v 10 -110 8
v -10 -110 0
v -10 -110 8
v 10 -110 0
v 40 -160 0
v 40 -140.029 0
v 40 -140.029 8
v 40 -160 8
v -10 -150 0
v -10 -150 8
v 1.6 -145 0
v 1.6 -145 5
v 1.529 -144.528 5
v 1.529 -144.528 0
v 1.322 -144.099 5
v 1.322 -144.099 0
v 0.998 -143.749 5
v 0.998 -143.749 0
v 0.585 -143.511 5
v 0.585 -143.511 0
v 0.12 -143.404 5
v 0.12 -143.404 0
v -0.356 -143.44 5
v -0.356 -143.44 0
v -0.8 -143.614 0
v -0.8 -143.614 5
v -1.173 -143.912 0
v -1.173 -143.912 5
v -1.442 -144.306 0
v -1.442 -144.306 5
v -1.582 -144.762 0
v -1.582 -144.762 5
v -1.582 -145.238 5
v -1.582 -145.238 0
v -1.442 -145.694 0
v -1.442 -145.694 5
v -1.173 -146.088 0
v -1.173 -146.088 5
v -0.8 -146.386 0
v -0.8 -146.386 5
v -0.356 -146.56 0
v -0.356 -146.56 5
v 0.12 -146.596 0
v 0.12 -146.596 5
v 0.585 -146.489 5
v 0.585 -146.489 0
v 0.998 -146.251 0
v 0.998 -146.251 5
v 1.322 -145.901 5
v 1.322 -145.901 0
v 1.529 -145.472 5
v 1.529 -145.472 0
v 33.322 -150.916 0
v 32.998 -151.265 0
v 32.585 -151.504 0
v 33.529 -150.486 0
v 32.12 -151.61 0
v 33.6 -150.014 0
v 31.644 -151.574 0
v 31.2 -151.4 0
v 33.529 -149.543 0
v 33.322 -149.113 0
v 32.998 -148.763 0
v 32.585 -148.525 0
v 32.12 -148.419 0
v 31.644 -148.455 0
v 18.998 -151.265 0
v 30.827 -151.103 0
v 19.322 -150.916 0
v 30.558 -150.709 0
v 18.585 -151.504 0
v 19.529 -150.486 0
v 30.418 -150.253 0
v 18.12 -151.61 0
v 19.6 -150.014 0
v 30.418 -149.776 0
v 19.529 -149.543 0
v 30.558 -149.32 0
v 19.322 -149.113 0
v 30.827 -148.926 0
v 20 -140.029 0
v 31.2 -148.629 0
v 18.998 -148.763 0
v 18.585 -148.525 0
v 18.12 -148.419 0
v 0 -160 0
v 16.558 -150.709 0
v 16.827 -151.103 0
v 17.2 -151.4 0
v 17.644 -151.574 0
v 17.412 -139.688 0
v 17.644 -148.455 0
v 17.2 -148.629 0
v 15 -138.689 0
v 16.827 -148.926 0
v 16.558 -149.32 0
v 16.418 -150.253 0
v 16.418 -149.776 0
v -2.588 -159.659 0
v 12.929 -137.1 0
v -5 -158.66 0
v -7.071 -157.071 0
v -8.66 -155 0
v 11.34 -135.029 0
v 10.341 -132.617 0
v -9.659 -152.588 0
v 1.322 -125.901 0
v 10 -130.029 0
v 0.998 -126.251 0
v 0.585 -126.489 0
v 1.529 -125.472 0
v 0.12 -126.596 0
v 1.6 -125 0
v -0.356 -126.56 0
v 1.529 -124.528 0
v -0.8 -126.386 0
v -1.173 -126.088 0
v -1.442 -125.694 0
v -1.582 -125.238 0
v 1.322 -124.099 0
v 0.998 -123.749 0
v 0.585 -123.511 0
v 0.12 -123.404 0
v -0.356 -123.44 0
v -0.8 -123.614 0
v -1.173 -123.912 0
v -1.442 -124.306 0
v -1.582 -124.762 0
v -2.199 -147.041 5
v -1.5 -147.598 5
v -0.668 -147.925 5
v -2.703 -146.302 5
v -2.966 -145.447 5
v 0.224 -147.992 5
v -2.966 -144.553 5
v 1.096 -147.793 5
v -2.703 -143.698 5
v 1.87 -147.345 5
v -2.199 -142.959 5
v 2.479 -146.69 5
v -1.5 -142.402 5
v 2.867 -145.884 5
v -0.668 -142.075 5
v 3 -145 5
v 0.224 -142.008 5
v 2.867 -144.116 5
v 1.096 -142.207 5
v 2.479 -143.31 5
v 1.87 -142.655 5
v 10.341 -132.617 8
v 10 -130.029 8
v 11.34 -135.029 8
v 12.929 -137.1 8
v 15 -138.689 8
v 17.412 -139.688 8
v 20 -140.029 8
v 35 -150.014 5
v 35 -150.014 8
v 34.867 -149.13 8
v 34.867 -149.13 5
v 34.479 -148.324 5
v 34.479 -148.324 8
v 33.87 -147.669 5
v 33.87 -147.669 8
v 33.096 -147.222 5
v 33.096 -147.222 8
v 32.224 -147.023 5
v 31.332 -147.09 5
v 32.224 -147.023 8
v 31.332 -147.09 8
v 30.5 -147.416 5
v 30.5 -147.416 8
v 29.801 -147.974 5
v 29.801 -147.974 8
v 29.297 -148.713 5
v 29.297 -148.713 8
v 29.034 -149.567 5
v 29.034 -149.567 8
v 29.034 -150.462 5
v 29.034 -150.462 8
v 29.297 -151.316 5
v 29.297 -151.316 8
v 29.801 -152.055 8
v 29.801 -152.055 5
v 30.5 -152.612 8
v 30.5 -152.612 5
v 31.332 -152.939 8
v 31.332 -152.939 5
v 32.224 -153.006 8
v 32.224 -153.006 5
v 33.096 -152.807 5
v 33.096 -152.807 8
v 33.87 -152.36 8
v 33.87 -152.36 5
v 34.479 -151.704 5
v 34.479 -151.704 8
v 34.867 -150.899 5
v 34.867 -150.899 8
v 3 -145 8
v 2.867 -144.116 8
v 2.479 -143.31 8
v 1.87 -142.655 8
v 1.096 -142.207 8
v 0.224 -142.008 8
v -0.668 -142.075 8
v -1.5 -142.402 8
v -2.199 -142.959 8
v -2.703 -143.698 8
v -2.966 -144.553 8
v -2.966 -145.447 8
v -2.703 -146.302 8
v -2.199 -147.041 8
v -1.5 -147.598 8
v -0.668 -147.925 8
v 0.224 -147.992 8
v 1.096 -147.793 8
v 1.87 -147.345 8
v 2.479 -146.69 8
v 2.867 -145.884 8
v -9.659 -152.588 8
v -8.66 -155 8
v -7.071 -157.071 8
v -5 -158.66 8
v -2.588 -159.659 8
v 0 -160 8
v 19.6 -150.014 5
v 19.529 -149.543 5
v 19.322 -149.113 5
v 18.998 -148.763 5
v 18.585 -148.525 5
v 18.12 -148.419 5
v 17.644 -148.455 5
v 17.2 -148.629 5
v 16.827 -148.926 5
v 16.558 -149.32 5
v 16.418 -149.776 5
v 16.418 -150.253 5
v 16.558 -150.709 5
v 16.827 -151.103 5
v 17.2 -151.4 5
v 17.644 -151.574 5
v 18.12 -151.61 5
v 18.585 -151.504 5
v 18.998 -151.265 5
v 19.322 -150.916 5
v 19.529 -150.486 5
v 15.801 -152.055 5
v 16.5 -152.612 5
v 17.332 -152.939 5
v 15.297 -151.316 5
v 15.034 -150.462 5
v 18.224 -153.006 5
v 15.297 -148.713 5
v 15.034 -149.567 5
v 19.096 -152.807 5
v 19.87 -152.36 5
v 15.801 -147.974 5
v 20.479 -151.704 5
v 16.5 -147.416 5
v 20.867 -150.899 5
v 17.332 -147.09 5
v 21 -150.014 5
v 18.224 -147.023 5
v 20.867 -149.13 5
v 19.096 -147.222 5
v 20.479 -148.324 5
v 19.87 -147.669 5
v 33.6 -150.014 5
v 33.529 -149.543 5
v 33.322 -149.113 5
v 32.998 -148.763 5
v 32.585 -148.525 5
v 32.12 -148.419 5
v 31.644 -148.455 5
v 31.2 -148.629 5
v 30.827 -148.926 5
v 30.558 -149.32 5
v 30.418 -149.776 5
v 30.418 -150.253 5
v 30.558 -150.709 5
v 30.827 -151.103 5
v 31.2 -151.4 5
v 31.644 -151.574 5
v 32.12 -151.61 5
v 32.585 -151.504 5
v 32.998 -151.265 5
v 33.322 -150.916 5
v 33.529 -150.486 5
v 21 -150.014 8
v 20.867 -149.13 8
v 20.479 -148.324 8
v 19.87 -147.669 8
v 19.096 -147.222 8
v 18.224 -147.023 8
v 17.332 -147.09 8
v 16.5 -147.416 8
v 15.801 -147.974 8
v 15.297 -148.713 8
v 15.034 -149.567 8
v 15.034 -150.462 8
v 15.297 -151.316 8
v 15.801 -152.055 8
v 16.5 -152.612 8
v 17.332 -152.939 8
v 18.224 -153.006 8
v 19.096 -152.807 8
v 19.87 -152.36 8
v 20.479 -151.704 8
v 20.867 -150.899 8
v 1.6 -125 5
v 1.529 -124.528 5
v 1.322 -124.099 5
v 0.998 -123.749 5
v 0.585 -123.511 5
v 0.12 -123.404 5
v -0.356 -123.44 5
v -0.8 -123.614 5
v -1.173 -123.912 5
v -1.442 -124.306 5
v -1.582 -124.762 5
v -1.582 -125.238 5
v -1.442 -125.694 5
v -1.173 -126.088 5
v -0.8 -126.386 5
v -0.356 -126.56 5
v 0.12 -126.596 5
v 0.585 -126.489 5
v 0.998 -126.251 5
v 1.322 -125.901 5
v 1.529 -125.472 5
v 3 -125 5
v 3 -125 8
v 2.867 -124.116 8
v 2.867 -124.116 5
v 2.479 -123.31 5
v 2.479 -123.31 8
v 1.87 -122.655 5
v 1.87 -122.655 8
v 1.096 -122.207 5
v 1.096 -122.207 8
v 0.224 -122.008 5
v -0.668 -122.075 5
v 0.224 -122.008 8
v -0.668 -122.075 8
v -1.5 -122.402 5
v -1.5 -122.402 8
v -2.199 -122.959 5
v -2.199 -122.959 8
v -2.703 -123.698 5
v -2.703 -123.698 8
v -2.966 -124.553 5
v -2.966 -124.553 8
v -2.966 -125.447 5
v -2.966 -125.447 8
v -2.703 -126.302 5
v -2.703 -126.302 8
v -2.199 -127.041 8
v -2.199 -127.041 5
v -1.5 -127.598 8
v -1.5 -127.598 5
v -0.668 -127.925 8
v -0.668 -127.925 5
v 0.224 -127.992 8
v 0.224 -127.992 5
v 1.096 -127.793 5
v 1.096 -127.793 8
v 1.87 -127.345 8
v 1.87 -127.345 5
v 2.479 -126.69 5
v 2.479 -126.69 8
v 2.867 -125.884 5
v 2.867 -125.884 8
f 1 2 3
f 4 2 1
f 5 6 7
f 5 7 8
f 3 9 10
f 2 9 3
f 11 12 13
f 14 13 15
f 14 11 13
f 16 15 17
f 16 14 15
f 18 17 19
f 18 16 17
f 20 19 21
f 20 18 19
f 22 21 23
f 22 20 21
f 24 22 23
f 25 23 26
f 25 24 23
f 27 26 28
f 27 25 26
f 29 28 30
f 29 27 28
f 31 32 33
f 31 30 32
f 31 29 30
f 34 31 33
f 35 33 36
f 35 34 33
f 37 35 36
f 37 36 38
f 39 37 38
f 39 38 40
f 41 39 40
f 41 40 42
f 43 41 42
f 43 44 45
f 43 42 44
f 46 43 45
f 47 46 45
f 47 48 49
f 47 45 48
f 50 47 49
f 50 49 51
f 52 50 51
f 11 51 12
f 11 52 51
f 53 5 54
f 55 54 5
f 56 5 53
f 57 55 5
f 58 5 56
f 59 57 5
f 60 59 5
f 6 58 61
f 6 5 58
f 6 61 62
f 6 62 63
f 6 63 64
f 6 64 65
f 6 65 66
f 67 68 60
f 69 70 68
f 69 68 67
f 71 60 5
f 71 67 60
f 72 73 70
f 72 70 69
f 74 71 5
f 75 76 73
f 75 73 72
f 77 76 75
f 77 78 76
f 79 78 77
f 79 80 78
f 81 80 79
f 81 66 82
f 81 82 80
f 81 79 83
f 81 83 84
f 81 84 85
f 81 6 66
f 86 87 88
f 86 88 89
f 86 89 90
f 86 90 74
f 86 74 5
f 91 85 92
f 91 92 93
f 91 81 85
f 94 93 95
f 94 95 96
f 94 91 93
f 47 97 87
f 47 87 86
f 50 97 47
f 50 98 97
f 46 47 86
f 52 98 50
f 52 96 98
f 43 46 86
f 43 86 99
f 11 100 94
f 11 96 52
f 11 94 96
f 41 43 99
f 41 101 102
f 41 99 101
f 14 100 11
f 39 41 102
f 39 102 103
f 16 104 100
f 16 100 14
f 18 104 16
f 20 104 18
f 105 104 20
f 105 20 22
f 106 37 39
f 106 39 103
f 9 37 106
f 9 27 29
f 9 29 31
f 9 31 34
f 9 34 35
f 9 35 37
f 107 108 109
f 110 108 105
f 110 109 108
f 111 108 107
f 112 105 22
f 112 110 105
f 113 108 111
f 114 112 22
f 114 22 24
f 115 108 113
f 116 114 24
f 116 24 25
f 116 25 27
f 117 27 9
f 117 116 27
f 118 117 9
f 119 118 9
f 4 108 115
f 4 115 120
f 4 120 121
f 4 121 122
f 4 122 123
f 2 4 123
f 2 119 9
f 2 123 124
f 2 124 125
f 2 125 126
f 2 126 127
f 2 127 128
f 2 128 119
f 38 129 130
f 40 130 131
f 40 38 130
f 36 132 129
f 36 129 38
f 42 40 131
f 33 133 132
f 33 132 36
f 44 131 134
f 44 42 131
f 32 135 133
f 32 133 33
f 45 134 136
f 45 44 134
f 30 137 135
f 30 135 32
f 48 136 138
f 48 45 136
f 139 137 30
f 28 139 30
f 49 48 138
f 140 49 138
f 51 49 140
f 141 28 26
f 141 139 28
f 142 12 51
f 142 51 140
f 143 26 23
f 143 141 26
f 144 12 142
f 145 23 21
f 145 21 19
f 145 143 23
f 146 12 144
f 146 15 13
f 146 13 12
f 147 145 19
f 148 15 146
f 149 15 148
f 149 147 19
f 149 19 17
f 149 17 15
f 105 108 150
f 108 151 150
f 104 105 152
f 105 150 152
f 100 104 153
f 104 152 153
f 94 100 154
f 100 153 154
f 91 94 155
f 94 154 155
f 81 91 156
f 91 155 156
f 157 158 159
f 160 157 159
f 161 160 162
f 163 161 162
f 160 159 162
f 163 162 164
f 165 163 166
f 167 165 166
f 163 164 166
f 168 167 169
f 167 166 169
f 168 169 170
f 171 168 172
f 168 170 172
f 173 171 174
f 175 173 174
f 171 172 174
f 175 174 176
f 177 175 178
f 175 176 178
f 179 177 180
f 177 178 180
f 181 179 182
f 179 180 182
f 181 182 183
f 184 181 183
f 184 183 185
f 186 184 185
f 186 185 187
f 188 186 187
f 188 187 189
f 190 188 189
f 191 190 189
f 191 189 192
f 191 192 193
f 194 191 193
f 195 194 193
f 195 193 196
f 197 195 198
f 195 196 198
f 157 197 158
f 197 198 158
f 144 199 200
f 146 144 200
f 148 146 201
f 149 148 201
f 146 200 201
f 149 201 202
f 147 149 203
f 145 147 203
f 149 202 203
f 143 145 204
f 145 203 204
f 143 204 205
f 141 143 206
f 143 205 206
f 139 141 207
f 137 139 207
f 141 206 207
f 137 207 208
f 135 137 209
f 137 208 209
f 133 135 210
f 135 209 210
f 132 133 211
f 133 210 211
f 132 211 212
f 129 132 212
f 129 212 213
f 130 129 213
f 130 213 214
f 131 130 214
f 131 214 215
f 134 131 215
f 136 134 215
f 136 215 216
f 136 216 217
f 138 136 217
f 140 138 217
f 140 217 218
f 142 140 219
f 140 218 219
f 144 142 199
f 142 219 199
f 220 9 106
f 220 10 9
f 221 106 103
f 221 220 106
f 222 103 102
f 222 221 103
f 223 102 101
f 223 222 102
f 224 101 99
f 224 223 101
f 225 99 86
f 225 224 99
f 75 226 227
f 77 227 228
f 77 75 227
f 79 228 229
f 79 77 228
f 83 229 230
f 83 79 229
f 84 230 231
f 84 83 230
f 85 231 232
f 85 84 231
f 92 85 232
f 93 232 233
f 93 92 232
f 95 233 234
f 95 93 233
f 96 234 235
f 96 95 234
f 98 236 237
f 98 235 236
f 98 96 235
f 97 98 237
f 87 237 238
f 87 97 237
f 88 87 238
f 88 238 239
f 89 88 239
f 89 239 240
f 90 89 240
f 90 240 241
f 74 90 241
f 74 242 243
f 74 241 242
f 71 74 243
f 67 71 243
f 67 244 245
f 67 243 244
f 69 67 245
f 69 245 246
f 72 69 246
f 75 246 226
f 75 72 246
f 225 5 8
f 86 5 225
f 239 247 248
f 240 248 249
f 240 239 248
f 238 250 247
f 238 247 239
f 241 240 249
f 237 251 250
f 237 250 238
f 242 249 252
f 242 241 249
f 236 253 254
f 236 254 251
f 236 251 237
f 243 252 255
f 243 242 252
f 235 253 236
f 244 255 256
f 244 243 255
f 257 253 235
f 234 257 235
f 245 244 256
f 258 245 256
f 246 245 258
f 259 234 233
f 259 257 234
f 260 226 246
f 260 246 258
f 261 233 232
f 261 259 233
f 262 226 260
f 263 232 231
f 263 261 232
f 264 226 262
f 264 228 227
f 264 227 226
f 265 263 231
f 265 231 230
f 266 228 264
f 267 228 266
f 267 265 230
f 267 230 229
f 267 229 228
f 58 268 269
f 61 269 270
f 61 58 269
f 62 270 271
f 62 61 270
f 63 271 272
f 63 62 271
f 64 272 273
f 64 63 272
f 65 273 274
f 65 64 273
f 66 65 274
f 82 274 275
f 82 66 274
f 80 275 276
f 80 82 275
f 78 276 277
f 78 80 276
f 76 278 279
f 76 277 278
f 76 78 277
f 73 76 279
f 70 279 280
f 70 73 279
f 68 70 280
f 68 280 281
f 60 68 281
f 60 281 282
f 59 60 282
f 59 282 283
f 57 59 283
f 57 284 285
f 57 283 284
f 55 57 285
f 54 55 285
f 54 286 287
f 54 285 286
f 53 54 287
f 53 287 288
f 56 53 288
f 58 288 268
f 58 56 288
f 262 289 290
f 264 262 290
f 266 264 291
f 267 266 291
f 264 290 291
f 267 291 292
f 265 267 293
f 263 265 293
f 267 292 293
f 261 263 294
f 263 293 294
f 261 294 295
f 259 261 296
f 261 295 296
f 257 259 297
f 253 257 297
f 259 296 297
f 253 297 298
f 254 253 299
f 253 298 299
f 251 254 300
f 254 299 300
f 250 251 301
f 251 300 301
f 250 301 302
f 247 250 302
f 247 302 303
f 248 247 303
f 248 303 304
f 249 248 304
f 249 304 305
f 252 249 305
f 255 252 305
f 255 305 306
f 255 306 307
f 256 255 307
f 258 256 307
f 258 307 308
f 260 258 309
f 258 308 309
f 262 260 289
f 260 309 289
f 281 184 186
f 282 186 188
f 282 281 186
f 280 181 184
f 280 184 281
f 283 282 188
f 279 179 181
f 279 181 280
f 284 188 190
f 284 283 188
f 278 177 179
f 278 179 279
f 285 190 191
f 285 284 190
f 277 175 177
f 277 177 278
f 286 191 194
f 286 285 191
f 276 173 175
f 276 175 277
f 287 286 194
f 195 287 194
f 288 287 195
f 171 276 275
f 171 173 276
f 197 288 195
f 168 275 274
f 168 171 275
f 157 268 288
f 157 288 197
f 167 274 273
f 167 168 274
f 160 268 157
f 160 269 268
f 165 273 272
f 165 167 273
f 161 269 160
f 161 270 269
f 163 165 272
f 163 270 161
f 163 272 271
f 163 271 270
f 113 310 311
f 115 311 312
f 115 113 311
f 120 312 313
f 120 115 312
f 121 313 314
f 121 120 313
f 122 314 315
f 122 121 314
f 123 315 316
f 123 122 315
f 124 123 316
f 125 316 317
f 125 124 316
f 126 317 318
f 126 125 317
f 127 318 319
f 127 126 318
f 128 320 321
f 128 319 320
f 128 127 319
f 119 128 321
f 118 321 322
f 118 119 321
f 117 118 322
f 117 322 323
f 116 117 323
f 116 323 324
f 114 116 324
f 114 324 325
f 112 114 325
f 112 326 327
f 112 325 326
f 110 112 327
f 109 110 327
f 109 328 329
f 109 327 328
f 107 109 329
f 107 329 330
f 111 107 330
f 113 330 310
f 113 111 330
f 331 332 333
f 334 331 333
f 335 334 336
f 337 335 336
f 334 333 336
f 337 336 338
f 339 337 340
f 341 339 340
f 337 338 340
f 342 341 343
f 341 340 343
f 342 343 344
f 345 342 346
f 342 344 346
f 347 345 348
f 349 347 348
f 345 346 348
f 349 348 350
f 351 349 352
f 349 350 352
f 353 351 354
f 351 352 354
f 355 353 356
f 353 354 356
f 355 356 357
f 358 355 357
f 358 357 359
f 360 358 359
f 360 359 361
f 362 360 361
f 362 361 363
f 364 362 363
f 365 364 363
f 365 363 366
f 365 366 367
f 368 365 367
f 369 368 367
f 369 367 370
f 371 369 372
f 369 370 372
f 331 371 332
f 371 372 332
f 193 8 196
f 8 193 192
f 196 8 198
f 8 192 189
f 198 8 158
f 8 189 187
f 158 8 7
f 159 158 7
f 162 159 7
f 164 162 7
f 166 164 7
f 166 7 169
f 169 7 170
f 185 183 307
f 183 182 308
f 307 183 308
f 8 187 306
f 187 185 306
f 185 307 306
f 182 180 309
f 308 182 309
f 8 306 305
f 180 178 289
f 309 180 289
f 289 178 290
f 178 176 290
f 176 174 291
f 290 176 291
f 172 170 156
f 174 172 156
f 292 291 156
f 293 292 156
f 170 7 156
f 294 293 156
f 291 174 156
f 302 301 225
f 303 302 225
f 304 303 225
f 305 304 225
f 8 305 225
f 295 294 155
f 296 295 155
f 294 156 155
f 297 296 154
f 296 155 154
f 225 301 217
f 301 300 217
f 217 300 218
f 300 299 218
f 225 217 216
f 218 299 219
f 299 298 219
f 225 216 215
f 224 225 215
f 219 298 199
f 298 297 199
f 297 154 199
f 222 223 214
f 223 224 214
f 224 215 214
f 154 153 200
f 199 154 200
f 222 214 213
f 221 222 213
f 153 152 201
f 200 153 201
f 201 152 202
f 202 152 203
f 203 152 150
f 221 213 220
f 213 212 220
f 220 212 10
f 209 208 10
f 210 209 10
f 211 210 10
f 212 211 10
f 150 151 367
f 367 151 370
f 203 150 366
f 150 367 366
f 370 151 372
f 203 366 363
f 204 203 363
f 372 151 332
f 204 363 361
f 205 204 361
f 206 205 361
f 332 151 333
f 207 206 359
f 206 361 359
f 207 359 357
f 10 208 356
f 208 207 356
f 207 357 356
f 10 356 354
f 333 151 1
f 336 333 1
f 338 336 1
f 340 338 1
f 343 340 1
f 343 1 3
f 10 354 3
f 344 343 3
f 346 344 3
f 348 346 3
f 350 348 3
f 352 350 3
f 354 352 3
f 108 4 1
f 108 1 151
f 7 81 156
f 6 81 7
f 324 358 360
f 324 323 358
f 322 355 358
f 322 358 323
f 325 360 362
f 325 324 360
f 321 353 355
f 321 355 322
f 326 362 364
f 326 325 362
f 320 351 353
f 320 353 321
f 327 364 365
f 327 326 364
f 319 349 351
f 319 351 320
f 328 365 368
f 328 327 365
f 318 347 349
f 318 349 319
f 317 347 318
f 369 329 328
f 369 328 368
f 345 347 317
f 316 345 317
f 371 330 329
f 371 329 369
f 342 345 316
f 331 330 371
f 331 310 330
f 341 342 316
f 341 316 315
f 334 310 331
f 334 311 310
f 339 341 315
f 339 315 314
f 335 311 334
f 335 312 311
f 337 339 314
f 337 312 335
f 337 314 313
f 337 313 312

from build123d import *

# Parameters (mm, degrees)
SKETCH_1_R          = 1.6
EXTRUDE_1_DEPTH     = 8
SKETCH_2_R          = 3
CUT_EXTRUDE_1_DEPTH = 3
FILLET_1_R          = 10


with BuildPart() as part:
    # 草图1 → 凸台-拉伸1 (new body)
    with BuildSketch(Plane.XY):
        Polygon((-10, -110), (10, -110), (10, -140.028839027), (40, -140.028839027), (40, -160), (-10, -160), align=None)
        with Locations((0, -125)):
            Circle(SKETCH_1_R, mode=Mode.SUBTRACT)
        with Locations((0, -145)):
            Circle(SKETCH_1_R, mode=Mode.SUBTRACT)
        with Locations((18, -150.014419513)):
            Circle(SKETCH_1_R, mode=Mode.SUBTRACT)
        with Locations((32, -150.014419513)):
            Circle(SKETCH_1_R, mode=Mode.SUBTRACT)
    extrude(amount=EXTRUDE_1_DEPTH)

    # 草图2 → 切除-拉伸1 (cut)
    with BuildSketch(Plane.XY.offset(8)):
        with Locations((32, -150.014419513)):
            Circle(SKETCH_2_R)
        with Locations((18, -150.014419513)):
            Circle(SKETCH_2_R)
        with Locations((0, -145)):
            Circle(SKETCH_2_R)
        with Locations((0, -125)):
            Circle(SKETCH_2_R)
    extrude(amount=-CUT_EXTRUDE_1_DEPTH, mode=Mode.SUBTRACT)

    # 圆角1
    fillet_1_edges = [part.edges().sort_by_distance(p)[0] for p in [
        (10, -140.028839027, 4),
        (-10, -160, 4),
    ]]
    fillet(fillet_1_edges, radius=FILLET_1_R)


solid = part.part
